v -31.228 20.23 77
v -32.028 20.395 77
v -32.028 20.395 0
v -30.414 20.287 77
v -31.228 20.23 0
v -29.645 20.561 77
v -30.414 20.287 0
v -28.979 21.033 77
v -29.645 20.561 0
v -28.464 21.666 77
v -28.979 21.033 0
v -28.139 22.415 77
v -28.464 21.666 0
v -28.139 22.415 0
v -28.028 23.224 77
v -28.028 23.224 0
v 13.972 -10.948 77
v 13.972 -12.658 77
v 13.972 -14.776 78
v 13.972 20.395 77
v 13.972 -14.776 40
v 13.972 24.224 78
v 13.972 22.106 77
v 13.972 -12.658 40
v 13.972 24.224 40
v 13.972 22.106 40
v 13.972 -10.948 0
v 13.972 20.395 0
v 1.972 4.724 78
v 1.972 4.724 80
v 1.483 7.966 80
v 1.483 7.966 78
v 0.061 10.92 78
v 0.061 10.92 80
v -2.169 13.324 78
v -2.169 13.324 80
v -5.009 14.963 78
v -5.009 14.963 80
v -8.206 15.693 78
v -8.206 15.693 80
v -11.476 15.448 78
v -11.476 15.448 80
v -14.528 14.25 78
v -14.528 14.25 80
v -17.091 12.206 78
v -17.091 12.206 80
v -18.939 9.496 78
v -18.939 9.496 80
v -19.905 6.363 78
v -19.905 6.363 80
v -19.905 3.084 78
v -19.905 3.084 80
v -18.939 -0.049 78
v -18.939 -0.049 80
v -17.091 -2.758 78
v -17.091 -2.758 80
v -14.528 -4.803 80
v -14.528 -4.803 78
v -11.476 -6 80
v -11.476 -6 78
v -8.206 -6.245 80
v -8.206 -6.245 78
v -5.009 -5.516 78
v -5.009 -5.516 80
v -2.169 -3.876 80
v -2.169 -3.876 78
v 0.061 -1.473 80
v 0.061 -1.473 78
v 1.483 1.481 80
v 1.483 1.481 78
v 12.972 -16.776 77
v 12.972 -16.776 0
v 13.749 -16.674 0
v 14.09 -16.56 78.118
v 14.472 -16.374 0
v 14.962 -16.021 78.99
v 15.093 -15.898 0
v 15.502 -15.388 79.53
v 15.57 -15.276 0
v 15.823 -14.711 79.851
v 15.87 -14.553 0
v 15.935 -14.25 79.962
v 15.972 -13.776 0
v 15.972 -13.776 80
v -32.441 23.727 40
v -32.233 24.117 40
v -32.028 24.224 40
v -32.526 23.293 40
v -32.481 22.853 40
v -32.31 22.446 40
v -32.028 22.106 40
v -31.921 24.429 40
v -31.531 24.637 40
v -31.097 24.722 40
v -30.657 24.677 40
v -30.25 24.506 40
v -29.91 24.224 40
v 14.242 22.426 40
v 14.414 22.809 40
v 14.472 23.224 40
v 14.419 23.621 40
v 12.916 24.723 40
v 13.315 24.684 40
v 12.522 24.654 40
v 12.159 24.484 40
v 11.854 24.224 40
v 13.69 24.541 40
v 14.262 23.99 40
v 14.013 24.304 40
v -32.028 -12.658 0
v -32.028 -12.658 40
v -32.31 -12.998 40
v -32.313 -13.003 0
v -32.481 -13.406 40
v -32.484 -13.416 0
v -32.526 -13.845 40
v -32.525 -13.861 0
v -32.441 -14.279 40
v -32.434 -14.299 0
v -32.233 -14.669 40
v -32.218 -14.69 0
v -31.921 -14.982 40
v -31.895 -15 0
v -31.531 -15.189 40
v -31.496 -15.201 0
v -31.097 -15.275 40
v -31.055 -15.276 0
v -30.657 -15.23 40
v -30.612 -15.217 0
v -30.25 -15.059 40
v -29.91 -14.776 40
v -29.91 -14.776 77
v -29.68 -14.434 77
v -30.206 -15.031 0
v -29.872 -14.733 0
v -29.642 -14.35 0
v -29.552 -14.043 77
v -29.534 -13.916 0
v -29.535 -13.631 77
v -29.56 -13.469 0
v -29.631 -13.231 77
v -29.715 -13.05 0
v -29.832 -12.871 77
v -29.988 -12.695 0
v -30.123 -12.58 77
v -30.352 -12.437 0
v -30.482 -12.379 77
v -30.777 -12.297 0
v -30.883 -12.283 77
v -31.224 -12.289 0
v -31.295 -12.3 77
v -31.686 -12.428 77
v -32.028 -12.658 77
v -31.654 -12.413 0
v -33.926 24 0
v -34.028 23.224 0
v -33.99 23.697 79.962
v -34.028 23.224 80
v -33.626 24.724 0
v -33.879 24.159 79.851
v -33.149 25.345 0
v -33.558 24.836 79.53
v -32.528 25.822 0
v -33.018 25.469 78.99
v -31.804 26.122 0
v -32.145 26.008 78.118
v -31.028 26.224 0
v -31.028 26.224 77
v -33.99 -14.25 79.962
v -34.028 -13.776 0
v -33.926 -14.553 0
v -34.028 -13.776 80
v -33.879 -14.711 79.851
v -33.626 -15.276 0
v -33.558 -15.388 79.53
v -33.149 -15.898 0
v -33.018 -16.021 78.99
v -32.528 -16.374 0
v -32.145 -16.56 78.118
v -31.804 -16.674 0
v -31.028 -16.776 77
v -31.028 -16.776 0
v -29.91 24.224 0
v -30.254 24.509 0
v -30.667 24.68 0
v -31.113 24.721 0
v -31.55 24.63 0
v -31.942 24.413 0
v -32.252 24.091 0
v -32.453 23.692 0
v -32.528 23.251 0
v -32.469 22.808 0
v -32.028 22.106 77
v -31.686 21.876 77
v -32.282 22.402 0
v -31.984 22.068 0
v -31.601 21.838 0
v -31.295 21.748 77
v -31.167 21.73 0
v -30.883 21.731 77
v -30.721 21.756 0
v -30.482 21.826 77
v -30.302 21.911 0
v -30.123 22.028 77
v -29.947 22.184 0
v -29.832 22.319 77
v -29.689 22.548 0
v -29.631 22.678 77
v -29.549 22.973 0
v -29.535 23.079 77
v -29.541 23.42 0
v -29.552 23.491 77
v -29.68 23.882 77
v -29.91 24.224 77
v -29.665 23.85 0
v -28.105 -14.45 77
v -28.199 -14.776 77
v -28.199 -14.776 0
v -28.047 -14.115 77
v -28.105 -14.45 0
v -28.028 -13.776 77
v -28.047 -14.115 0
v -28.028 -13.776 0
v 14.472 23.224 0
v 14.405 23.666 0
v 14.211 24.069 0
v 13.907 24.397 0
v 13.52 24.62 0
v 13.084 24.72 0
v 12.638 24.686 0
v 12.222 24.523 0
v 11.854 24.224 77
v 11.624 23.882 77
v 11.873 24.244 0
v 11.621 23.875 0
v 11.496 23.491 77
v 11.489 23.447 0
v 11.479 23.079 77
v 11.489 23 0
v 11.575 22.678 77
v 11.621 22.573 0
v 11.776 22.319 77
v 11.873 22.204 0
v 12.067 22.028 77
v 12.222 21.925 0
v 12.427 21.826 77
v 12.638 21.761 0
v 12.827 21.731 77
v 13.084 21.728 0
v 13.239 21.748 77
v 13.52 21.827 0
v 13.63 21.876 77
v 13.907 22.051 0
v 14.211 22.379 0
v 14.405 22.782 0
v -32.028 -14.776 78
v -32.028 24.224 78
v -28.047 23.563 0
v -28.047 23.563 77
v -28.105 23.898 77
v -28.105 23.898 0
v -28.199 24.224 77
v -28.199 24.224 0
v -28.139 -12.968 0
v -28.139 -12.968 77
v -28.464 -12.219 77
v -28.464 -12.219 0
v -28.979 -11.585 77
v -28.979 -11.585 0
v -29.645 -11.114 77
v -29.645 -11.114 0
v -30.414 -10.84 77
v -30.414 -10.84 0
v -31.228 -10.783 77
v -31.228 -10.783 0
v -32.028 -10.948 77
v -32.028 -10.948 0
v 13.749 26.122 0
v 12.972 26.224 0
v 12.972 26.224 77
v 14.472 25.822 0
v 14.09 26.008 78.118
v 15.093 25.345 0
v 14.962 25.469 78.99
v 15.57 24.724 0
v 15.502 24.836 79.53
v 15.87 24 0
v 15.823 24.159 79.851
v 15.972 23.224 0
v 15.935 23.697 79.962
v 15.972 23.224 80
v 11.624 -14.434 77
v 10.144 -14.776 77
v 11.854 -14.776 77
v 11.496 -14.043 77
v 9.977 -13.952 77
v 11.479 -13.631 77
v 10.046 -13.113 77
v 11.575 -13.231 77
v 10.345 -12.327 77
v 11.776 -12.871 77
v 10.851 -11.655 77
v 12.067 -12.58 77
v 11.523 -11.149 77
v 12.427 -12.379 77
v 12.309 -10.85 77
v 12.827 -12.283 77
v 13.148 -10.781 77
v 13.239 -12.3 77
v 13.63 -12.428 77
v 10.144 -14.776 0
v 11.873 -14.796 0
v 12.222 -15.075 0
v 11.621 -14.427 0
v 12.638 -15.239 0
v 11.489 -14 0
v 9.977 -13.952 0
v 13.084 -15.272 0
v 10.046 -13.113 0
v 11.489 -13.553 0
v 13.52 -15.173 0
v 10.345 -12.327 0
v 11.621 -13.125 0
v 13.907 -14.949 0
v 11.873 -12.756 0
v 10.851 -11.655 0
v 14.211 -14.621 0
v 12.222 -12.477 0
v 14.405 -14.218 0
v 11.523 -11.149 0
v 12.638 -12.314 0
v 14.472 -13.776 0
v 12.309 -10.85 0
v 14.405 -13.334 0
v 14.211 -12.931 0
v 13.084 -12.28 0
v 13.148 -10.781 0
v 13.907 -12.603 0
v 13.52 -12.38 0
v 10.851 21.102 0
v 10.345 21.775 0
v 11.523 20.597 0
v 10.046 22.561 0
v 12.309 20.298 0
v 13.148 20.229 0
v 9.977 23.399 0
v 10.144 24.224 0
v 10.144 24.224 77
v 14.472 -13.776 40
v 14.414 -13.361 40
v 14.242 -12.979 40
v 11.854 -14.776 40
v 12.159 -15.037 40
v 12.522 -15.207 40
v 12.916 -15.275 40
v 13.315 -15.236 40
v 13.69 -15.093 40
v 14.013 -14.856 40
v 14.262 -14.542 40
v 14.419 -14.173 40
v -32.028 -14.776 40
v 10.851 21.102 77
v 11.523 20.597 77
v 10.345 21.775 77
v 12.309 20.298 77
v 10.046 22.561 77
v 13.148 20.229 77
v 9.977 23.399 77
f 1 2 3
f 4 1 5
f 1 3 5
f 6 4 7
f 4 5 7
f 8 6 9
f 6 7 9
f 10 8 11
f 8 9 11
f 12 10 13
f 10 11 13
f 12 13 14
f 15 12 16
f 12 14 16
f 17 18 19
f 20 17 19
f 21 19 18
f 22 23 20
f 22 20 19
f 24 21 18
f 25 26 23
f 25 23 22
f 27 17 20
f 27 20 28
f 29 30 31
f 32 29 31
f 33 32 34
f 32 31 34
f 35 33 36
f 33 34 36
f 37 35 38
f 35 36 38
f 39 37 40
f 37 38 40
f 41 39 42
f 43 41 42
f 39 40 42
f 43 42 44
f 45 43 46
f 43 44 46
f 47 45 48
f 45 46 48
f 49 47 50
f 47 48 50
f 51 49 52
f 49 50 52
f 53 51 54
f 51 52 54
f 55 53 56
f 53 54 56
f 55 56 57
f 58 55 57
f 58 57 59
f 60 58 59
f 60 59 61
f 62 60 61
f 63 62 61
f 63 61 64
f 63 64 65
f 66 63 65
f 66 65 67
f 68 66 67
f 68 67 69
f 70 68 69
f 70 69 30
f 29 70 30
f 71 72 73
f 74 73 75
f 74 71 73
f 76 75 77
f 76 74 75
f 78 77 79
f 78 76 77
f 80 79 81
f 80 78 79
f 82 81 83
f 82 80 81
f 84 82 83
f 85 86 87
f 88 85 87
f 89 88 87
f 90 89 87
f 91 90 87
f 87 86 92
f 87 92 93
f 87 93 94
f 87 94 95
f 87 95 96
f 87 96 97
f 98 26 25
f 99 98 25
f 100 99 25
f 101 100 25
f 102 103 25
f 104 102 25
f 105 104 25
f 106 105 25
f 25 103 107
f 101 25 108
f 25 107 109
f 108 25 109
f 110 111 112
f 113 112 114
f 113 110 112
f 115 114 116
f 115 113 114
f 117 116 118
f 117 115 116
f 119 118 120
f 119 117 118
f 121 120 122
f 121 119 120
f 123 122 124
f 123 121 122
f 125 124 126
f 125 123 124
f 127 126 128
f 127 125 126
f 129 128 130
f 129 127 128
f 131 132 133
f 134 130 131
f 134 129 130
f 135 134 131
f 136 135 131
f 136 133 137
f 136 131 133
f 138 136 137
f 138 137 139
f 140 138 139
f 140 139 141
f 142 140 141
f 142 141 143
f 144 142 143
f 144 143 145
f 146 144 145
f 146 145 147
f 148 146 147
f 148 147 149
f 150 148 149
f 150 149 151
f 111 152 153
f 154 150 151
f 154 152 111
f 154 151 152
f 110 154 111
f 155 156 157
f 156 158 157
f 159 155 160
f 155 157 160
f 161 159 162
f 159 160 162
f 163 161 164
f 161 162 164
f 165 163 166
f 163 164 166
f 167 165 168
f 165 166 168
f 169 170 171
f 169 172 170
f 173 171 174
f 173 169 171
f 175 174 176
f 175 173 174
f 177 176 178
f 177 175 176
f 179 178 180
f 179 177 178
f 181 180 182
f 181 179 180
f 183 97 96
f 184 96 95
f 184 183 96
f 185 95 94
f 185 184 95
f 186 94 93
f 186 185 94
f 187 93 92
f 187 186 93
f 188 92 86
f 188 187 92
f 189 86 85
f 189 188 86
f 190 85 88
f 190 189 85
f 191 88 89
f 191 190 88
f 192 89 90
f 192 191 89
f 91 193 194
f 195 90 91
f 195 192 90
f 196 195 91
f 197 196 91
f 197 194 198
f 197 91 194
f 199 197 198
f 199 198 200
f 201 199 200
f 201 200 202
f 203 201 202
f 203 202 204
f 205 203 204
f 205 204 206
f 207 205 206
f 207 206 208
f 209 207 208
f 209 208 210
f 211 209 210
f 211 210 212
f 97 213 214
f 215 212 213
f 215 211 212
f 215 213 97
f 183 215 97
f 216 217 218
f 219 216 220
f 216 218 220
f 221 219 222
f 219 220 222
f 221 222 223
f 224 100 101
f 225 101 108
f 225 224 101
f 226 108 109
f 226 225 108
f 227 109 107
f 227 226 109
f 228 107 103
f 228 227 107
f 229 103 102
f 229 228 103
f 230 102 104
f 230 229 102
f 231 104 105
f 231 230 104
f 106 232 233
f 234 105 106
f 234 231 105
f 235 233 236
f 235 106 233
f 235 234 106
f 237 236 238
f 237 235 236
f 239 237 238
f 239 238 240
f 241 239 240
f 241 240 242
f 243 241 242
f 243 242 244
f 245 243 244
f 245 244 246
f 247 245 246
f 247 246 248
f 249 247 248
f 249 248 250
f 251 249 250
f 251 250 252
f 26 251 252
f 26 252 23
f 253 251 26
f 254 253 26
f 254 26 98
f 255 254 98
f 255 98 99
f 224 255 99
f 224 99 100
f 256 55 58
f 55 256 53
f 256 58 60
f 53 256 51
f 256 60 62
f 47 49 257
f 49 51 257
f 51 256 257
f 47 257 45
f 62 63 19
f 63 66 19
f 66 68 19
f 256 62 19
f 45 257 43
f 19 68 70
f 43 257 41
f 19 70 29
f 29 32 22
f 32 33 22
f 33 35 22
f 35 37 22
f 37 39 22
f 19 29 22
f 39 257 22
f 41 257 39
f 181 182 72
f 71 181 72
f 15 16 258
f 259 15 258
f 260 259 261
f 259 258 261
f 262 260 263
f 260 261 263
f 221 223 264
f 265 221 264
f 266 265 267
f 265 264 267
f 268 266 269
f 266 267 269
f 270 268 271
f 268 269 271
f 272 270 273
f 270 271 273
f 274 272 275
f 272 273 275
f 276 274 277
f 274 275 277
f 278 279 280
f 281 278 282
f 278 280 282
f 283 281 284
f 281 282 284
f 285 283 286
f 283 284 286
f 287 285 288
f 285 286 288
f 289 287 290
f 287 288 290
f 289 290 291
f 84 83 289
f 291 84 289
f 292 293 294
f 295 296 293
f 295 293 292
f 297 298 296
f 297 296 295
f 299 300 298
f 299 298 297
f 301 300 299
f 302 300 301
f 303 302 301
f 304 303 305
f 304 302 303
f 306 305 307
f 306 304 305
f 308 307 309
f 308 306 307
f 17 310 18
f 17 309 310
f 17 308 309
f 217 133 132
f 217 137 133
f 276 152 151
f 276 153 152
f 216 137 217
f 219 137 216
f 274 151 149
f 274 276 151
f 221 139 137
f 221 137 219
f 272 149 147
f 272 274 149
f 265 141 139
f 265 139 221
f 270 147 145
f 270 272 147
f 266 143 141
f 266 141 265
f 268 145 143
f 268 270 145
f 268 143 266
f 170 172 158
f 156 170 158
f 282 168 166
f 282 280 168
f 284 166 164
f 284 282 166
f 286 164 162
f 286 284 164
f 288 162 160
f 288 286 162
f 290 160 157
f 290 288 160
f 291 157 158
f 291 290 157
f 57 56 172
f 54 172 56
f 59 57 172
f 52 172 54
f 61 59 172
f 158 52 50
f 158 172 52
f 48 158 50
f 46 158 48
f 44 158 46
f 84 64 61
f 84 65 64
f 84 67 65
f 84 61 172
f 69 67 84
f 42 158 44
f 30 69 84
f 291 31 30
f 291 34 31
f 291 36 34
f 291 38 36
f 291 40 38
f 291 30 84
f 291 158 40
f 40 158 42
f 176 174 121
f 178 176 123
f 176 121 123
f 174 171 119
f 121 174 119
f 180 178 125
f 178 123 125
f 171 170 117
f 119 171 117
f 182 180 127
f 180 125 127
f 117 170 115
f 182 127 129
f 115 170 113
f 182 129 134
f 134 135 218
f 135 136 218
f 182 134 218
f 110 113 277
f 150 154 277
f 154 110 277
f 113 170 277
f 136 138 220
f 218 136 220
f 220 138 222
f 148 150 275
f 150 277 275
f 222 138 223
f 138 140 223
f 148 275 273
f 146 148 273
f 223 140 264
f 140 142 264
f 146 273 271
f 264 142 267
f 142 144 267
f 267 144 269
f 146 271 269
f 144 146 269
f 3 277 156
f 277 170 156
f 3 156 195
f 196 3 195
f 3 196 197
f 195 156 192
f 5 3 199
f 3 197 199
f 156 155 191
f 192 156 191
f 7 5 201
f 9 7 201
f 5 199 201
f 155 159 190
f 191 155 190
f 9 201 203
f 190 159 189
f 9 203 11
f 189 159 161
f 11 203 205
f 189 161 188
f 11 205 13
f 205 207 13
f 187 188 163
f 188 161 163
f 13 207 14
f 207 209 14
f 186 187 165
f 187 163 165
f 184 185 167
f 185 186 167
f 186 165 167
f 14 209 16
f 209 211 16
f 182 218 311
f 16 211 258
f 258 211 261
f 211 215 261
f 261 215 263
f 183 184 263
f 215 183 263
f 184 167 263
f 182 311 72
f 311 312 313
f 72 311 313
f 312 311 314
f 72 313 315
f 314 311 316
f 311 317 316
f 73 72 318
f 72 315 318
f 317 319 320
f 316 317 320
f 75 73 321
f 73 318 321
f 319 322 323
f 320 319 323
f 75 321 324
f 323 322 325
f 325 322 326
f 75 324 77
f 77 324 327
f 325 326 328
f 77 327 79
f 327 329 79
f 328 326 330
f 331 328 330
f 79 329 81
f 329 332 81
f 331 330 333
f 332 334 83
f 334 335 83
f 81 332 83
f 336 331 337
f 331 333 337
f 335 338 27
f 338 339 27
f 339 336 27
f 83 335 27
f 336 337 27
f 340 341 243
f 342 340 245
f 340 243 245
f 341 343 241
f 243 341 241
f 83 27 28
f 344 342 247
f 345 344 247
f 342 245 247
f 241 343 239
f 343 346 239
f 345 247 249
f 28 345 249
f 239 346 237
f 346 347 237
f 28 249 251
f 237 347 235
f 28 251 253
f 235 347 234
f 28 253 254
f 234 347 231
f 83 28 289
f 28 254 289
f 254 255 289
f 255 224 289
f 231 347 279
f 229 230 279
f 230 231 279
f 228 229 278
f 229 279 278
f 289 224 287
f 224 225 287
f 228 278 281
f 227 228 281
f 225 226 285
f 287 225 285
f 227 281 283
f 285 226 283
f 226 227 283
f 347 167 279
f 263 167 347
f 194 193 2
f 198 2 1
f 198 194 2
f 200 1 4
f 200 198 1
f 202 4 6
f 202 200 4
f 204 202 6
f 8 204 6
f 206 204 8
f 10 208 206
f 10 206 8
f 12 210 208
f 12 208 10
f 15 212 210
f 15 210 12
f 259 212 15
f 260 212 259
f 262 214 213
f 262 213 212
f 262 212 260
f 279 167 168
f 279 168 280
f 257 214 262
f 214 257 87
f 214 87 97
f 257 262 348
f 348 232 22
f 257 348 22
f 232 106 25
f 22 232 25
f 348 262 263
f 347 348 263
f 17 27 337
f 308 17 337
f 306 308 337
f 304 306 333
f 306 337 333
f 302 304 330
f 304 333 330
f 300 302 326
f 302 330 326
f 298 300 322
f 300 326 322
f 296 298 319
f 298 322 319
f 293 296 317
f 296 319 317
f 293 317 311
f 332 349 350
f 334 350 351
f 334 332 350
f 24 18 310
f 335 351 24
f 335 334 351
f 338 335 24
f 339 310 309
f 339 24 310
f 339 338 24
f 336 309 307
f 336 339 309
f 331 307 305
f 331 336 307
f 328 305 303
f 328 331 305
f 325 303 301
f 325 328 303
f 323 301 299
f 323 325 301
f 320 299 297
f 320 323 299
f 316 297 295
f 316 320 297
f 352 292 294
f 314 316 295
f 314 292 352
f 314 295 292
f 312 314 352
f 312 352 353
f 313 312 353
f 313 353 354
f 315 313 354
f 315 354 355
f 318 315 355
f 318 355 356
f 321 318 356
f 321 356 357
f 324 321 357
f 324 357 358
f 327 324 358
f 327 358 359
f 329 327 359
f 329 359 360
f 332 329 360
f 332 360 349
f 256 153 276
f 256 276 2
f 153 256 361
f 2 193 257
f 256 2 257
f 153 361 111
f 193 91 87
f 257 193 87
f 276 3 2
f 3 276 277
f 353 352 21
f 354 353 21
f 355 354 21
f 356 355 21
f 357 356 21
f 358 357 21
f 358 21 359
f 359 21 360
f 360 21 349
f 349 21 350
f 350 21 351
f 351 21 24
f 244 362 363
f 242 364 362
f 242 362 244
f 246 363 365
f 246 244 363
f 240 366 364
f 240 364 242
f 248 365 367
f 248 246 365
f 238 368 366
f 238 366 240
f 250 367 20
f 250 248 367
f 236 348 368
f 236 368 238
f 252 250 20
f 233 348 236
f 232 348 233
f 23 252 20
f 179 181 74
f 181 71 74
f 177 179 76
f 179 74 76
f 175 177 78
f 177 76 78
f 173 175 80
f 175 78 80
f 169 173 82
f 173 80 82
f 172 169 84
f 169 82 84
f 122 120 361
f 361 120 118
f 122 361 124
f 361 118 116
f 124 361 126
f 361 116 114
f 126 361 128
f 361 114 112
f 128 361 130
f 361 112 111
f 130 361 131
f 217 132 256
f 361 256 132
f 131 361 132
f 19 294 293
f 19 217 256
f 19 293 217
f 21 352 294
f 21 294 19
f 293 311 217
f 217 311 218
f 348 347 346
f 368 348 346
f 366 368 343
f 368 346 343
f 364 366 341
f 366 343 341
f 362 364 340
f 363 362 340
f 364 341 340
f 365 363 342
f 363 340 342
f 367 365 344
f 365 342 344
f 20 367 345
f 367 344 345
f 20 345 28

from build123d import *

# Parameters (mm, degrees)
F0_W     = 50
F0_H     = 43
F0_R     = 1.5
F1_DEPTH = 80
F3_T     = -2
F2_R     = 11
F4_DEPTH = 3.1
F5_R     = 3
F6_R     = 1.5
F7_DEPTH = 77
F8_DEPTH = 40


# Not quite as in the source:
# - a feature names something its author has since deleted; it is built from what else it names


with BuildPart() as f1:
    # F0 (on Top) → F1 (new body)
    with BuildSketch(Plane.XY):
        with Locations((-9.0278687937, 4.7237686813)):
            Rectangle(F0_W, F0_H)
        with Locations((-31.0278687937, -13.7762313187)):
            Circle(F0_R, mode=Mode.SUBTRACT)
        with Locations((12.9721312063, -13.7762313187)):
            Circle(F0_R, mode=Mode.SUBTRACT)
        with Locations((-31.0278687937, 23.2237686813)):
            Circle(F0_R, mode=Mode.SUBTRACT)
        with Locations((12.9721312063, 23.2237686813)):
            Circle(F0_R, mode=Mode.SUBTRACT)
        with Locations((12.9721312063, 23.2237686813)):
            Circle(F0_R)
        with Locations((12.9721312063, -13.7762313187)):
            Circle(F0_R)
        with Locations((-31.0278687937, -13.7762313187)):
            Circle(F0_R)
        with Locations((-31.0278687937, 23.2237686813)):
            Circle(F0_R)
    extrude(amount=F1_DEPTH)

    # F3
    f3_openings = [f1.faces().sort_by_distance(p)[0] for p in [
        (-9.027869, 4.723769, 0),
    ]]
    offset(amount=F3_T, openings=f3_openings)

    # F2 (on face) → F4 (cut)
    with BuildSketch(Plane.XY.offset(80)):
        with Locations((-9.0278687937, 4.7237686813)):
            Circle(F2_R)
    extrude(amount=-F4_DEPTH, mode=Mode.SUBTRACT)

    # F5
    f5_edges = [f1.edges().sort_by_distance(p)[0] for p in [
        (15.972131, 26.223769, 40),
        (-9.027869, 26.223769, 80),
        (-34.027869, 26.223769, 40),
        (15.972131, -16.776231, 40),
        (-9.027869, -16.776231, 80),
        (-34.027869, -16.776231, 40),
    ]]
    fillet(f5_edges, radius=F5_R)

    # F6 (on face) → F7 (join)
    with BuildSketch(Plane.XY):
        with BuildLine():
            ThreePointArc((12.9721312104, -16.7762313187), (15.0934515513, -15.8975516608), (15.9721312063, -13.7762313187))
            ThreePointArc((15.9721312063, -13.7762313187), (10.8508108613, -11.6549109766), (12.9721312104, -16.7762313187))
        make_face()
        with Locations((12.9721312063, -13.7762313187)):
            Circle(F6_R, mode=Mode.SUBTRACT)
        with BuildLine():
            ThreePointArc((12.9721312063, 26.2237686813), (10.8508108627, 21.1024483377), (15.9721312063, 23.2237686813))
            ThreePointArc((15.9721312063, 23.2237686813), (15.0934515498, 25.3450890248), (12.9721312063, 26.2237686813))
        make_face()
        with Locations((12.9721312063, 23.2237686813)):
            Circle(F6_R, mode=Mode.SUBTRACT)
        with BuildLine():
            ThreePointArc((-34.0278687937, -13.776231286), (-33.1491891488, -15.8975516507), (-31.0278687937, -16.7762313187))
            ThreePointArc((-31.0278687937, -16.7762313187), (-28.9065484502, -15.8975516623), (-28.0278687937, -13.7762313187))
            ThreePointArc((-28.0278687937, -13.7762313187), (-31.0278687774, -10.7762313187), (-34.0278687937, -13.776231286))
        make_face()
        with Locations((-31.0278687937, -13.7762313187)):
            Circle(F6_R, mode=Mode.SUBTRACT)
        with BuildLine():
            ThreePointArc((-28.0278687937, 23.2237686813), (-28.9065484366, 25.3450890113), (-31.0278687555, 26.2237686813))
            ThreePointArc((-31.0278687555, 26.2237686813), (-33.1491891237, 25.3450890384), (-34.0278687937, 23.2237686813))
            ThreePointArc((-34.0278687937, 23.2237686813), (-31.0278687937, 20.2237686813), (-28.0278687937, 23.2237686813))
        make_face()
        with Locations((-31.0278687937, 23.2237686813)):
            Circle(F6_R, mode=Mode.SUBTRACT)
    extrude(amount=F7_DEPTH)

    # F0 (on Top) → F8 (cut)
    with BuildSketch(Plane.XY):
        with Locations((-31.0278687937, 23.2237686813)):
            Circle(F0_R)
        with Locations((12.9721312063, 23.2237686813)):
            Circle(F0_R)
        with Locations((-31.0278687937, -13.7762313187)):
            Circle(F0_R)
        with Locations((12.9721312063, -13.7762313187)):
            Circle(F0_R)
    extrude(amount=F8_DEPTH, mode=Mode.SUBTRACT)


solid = f1.part
